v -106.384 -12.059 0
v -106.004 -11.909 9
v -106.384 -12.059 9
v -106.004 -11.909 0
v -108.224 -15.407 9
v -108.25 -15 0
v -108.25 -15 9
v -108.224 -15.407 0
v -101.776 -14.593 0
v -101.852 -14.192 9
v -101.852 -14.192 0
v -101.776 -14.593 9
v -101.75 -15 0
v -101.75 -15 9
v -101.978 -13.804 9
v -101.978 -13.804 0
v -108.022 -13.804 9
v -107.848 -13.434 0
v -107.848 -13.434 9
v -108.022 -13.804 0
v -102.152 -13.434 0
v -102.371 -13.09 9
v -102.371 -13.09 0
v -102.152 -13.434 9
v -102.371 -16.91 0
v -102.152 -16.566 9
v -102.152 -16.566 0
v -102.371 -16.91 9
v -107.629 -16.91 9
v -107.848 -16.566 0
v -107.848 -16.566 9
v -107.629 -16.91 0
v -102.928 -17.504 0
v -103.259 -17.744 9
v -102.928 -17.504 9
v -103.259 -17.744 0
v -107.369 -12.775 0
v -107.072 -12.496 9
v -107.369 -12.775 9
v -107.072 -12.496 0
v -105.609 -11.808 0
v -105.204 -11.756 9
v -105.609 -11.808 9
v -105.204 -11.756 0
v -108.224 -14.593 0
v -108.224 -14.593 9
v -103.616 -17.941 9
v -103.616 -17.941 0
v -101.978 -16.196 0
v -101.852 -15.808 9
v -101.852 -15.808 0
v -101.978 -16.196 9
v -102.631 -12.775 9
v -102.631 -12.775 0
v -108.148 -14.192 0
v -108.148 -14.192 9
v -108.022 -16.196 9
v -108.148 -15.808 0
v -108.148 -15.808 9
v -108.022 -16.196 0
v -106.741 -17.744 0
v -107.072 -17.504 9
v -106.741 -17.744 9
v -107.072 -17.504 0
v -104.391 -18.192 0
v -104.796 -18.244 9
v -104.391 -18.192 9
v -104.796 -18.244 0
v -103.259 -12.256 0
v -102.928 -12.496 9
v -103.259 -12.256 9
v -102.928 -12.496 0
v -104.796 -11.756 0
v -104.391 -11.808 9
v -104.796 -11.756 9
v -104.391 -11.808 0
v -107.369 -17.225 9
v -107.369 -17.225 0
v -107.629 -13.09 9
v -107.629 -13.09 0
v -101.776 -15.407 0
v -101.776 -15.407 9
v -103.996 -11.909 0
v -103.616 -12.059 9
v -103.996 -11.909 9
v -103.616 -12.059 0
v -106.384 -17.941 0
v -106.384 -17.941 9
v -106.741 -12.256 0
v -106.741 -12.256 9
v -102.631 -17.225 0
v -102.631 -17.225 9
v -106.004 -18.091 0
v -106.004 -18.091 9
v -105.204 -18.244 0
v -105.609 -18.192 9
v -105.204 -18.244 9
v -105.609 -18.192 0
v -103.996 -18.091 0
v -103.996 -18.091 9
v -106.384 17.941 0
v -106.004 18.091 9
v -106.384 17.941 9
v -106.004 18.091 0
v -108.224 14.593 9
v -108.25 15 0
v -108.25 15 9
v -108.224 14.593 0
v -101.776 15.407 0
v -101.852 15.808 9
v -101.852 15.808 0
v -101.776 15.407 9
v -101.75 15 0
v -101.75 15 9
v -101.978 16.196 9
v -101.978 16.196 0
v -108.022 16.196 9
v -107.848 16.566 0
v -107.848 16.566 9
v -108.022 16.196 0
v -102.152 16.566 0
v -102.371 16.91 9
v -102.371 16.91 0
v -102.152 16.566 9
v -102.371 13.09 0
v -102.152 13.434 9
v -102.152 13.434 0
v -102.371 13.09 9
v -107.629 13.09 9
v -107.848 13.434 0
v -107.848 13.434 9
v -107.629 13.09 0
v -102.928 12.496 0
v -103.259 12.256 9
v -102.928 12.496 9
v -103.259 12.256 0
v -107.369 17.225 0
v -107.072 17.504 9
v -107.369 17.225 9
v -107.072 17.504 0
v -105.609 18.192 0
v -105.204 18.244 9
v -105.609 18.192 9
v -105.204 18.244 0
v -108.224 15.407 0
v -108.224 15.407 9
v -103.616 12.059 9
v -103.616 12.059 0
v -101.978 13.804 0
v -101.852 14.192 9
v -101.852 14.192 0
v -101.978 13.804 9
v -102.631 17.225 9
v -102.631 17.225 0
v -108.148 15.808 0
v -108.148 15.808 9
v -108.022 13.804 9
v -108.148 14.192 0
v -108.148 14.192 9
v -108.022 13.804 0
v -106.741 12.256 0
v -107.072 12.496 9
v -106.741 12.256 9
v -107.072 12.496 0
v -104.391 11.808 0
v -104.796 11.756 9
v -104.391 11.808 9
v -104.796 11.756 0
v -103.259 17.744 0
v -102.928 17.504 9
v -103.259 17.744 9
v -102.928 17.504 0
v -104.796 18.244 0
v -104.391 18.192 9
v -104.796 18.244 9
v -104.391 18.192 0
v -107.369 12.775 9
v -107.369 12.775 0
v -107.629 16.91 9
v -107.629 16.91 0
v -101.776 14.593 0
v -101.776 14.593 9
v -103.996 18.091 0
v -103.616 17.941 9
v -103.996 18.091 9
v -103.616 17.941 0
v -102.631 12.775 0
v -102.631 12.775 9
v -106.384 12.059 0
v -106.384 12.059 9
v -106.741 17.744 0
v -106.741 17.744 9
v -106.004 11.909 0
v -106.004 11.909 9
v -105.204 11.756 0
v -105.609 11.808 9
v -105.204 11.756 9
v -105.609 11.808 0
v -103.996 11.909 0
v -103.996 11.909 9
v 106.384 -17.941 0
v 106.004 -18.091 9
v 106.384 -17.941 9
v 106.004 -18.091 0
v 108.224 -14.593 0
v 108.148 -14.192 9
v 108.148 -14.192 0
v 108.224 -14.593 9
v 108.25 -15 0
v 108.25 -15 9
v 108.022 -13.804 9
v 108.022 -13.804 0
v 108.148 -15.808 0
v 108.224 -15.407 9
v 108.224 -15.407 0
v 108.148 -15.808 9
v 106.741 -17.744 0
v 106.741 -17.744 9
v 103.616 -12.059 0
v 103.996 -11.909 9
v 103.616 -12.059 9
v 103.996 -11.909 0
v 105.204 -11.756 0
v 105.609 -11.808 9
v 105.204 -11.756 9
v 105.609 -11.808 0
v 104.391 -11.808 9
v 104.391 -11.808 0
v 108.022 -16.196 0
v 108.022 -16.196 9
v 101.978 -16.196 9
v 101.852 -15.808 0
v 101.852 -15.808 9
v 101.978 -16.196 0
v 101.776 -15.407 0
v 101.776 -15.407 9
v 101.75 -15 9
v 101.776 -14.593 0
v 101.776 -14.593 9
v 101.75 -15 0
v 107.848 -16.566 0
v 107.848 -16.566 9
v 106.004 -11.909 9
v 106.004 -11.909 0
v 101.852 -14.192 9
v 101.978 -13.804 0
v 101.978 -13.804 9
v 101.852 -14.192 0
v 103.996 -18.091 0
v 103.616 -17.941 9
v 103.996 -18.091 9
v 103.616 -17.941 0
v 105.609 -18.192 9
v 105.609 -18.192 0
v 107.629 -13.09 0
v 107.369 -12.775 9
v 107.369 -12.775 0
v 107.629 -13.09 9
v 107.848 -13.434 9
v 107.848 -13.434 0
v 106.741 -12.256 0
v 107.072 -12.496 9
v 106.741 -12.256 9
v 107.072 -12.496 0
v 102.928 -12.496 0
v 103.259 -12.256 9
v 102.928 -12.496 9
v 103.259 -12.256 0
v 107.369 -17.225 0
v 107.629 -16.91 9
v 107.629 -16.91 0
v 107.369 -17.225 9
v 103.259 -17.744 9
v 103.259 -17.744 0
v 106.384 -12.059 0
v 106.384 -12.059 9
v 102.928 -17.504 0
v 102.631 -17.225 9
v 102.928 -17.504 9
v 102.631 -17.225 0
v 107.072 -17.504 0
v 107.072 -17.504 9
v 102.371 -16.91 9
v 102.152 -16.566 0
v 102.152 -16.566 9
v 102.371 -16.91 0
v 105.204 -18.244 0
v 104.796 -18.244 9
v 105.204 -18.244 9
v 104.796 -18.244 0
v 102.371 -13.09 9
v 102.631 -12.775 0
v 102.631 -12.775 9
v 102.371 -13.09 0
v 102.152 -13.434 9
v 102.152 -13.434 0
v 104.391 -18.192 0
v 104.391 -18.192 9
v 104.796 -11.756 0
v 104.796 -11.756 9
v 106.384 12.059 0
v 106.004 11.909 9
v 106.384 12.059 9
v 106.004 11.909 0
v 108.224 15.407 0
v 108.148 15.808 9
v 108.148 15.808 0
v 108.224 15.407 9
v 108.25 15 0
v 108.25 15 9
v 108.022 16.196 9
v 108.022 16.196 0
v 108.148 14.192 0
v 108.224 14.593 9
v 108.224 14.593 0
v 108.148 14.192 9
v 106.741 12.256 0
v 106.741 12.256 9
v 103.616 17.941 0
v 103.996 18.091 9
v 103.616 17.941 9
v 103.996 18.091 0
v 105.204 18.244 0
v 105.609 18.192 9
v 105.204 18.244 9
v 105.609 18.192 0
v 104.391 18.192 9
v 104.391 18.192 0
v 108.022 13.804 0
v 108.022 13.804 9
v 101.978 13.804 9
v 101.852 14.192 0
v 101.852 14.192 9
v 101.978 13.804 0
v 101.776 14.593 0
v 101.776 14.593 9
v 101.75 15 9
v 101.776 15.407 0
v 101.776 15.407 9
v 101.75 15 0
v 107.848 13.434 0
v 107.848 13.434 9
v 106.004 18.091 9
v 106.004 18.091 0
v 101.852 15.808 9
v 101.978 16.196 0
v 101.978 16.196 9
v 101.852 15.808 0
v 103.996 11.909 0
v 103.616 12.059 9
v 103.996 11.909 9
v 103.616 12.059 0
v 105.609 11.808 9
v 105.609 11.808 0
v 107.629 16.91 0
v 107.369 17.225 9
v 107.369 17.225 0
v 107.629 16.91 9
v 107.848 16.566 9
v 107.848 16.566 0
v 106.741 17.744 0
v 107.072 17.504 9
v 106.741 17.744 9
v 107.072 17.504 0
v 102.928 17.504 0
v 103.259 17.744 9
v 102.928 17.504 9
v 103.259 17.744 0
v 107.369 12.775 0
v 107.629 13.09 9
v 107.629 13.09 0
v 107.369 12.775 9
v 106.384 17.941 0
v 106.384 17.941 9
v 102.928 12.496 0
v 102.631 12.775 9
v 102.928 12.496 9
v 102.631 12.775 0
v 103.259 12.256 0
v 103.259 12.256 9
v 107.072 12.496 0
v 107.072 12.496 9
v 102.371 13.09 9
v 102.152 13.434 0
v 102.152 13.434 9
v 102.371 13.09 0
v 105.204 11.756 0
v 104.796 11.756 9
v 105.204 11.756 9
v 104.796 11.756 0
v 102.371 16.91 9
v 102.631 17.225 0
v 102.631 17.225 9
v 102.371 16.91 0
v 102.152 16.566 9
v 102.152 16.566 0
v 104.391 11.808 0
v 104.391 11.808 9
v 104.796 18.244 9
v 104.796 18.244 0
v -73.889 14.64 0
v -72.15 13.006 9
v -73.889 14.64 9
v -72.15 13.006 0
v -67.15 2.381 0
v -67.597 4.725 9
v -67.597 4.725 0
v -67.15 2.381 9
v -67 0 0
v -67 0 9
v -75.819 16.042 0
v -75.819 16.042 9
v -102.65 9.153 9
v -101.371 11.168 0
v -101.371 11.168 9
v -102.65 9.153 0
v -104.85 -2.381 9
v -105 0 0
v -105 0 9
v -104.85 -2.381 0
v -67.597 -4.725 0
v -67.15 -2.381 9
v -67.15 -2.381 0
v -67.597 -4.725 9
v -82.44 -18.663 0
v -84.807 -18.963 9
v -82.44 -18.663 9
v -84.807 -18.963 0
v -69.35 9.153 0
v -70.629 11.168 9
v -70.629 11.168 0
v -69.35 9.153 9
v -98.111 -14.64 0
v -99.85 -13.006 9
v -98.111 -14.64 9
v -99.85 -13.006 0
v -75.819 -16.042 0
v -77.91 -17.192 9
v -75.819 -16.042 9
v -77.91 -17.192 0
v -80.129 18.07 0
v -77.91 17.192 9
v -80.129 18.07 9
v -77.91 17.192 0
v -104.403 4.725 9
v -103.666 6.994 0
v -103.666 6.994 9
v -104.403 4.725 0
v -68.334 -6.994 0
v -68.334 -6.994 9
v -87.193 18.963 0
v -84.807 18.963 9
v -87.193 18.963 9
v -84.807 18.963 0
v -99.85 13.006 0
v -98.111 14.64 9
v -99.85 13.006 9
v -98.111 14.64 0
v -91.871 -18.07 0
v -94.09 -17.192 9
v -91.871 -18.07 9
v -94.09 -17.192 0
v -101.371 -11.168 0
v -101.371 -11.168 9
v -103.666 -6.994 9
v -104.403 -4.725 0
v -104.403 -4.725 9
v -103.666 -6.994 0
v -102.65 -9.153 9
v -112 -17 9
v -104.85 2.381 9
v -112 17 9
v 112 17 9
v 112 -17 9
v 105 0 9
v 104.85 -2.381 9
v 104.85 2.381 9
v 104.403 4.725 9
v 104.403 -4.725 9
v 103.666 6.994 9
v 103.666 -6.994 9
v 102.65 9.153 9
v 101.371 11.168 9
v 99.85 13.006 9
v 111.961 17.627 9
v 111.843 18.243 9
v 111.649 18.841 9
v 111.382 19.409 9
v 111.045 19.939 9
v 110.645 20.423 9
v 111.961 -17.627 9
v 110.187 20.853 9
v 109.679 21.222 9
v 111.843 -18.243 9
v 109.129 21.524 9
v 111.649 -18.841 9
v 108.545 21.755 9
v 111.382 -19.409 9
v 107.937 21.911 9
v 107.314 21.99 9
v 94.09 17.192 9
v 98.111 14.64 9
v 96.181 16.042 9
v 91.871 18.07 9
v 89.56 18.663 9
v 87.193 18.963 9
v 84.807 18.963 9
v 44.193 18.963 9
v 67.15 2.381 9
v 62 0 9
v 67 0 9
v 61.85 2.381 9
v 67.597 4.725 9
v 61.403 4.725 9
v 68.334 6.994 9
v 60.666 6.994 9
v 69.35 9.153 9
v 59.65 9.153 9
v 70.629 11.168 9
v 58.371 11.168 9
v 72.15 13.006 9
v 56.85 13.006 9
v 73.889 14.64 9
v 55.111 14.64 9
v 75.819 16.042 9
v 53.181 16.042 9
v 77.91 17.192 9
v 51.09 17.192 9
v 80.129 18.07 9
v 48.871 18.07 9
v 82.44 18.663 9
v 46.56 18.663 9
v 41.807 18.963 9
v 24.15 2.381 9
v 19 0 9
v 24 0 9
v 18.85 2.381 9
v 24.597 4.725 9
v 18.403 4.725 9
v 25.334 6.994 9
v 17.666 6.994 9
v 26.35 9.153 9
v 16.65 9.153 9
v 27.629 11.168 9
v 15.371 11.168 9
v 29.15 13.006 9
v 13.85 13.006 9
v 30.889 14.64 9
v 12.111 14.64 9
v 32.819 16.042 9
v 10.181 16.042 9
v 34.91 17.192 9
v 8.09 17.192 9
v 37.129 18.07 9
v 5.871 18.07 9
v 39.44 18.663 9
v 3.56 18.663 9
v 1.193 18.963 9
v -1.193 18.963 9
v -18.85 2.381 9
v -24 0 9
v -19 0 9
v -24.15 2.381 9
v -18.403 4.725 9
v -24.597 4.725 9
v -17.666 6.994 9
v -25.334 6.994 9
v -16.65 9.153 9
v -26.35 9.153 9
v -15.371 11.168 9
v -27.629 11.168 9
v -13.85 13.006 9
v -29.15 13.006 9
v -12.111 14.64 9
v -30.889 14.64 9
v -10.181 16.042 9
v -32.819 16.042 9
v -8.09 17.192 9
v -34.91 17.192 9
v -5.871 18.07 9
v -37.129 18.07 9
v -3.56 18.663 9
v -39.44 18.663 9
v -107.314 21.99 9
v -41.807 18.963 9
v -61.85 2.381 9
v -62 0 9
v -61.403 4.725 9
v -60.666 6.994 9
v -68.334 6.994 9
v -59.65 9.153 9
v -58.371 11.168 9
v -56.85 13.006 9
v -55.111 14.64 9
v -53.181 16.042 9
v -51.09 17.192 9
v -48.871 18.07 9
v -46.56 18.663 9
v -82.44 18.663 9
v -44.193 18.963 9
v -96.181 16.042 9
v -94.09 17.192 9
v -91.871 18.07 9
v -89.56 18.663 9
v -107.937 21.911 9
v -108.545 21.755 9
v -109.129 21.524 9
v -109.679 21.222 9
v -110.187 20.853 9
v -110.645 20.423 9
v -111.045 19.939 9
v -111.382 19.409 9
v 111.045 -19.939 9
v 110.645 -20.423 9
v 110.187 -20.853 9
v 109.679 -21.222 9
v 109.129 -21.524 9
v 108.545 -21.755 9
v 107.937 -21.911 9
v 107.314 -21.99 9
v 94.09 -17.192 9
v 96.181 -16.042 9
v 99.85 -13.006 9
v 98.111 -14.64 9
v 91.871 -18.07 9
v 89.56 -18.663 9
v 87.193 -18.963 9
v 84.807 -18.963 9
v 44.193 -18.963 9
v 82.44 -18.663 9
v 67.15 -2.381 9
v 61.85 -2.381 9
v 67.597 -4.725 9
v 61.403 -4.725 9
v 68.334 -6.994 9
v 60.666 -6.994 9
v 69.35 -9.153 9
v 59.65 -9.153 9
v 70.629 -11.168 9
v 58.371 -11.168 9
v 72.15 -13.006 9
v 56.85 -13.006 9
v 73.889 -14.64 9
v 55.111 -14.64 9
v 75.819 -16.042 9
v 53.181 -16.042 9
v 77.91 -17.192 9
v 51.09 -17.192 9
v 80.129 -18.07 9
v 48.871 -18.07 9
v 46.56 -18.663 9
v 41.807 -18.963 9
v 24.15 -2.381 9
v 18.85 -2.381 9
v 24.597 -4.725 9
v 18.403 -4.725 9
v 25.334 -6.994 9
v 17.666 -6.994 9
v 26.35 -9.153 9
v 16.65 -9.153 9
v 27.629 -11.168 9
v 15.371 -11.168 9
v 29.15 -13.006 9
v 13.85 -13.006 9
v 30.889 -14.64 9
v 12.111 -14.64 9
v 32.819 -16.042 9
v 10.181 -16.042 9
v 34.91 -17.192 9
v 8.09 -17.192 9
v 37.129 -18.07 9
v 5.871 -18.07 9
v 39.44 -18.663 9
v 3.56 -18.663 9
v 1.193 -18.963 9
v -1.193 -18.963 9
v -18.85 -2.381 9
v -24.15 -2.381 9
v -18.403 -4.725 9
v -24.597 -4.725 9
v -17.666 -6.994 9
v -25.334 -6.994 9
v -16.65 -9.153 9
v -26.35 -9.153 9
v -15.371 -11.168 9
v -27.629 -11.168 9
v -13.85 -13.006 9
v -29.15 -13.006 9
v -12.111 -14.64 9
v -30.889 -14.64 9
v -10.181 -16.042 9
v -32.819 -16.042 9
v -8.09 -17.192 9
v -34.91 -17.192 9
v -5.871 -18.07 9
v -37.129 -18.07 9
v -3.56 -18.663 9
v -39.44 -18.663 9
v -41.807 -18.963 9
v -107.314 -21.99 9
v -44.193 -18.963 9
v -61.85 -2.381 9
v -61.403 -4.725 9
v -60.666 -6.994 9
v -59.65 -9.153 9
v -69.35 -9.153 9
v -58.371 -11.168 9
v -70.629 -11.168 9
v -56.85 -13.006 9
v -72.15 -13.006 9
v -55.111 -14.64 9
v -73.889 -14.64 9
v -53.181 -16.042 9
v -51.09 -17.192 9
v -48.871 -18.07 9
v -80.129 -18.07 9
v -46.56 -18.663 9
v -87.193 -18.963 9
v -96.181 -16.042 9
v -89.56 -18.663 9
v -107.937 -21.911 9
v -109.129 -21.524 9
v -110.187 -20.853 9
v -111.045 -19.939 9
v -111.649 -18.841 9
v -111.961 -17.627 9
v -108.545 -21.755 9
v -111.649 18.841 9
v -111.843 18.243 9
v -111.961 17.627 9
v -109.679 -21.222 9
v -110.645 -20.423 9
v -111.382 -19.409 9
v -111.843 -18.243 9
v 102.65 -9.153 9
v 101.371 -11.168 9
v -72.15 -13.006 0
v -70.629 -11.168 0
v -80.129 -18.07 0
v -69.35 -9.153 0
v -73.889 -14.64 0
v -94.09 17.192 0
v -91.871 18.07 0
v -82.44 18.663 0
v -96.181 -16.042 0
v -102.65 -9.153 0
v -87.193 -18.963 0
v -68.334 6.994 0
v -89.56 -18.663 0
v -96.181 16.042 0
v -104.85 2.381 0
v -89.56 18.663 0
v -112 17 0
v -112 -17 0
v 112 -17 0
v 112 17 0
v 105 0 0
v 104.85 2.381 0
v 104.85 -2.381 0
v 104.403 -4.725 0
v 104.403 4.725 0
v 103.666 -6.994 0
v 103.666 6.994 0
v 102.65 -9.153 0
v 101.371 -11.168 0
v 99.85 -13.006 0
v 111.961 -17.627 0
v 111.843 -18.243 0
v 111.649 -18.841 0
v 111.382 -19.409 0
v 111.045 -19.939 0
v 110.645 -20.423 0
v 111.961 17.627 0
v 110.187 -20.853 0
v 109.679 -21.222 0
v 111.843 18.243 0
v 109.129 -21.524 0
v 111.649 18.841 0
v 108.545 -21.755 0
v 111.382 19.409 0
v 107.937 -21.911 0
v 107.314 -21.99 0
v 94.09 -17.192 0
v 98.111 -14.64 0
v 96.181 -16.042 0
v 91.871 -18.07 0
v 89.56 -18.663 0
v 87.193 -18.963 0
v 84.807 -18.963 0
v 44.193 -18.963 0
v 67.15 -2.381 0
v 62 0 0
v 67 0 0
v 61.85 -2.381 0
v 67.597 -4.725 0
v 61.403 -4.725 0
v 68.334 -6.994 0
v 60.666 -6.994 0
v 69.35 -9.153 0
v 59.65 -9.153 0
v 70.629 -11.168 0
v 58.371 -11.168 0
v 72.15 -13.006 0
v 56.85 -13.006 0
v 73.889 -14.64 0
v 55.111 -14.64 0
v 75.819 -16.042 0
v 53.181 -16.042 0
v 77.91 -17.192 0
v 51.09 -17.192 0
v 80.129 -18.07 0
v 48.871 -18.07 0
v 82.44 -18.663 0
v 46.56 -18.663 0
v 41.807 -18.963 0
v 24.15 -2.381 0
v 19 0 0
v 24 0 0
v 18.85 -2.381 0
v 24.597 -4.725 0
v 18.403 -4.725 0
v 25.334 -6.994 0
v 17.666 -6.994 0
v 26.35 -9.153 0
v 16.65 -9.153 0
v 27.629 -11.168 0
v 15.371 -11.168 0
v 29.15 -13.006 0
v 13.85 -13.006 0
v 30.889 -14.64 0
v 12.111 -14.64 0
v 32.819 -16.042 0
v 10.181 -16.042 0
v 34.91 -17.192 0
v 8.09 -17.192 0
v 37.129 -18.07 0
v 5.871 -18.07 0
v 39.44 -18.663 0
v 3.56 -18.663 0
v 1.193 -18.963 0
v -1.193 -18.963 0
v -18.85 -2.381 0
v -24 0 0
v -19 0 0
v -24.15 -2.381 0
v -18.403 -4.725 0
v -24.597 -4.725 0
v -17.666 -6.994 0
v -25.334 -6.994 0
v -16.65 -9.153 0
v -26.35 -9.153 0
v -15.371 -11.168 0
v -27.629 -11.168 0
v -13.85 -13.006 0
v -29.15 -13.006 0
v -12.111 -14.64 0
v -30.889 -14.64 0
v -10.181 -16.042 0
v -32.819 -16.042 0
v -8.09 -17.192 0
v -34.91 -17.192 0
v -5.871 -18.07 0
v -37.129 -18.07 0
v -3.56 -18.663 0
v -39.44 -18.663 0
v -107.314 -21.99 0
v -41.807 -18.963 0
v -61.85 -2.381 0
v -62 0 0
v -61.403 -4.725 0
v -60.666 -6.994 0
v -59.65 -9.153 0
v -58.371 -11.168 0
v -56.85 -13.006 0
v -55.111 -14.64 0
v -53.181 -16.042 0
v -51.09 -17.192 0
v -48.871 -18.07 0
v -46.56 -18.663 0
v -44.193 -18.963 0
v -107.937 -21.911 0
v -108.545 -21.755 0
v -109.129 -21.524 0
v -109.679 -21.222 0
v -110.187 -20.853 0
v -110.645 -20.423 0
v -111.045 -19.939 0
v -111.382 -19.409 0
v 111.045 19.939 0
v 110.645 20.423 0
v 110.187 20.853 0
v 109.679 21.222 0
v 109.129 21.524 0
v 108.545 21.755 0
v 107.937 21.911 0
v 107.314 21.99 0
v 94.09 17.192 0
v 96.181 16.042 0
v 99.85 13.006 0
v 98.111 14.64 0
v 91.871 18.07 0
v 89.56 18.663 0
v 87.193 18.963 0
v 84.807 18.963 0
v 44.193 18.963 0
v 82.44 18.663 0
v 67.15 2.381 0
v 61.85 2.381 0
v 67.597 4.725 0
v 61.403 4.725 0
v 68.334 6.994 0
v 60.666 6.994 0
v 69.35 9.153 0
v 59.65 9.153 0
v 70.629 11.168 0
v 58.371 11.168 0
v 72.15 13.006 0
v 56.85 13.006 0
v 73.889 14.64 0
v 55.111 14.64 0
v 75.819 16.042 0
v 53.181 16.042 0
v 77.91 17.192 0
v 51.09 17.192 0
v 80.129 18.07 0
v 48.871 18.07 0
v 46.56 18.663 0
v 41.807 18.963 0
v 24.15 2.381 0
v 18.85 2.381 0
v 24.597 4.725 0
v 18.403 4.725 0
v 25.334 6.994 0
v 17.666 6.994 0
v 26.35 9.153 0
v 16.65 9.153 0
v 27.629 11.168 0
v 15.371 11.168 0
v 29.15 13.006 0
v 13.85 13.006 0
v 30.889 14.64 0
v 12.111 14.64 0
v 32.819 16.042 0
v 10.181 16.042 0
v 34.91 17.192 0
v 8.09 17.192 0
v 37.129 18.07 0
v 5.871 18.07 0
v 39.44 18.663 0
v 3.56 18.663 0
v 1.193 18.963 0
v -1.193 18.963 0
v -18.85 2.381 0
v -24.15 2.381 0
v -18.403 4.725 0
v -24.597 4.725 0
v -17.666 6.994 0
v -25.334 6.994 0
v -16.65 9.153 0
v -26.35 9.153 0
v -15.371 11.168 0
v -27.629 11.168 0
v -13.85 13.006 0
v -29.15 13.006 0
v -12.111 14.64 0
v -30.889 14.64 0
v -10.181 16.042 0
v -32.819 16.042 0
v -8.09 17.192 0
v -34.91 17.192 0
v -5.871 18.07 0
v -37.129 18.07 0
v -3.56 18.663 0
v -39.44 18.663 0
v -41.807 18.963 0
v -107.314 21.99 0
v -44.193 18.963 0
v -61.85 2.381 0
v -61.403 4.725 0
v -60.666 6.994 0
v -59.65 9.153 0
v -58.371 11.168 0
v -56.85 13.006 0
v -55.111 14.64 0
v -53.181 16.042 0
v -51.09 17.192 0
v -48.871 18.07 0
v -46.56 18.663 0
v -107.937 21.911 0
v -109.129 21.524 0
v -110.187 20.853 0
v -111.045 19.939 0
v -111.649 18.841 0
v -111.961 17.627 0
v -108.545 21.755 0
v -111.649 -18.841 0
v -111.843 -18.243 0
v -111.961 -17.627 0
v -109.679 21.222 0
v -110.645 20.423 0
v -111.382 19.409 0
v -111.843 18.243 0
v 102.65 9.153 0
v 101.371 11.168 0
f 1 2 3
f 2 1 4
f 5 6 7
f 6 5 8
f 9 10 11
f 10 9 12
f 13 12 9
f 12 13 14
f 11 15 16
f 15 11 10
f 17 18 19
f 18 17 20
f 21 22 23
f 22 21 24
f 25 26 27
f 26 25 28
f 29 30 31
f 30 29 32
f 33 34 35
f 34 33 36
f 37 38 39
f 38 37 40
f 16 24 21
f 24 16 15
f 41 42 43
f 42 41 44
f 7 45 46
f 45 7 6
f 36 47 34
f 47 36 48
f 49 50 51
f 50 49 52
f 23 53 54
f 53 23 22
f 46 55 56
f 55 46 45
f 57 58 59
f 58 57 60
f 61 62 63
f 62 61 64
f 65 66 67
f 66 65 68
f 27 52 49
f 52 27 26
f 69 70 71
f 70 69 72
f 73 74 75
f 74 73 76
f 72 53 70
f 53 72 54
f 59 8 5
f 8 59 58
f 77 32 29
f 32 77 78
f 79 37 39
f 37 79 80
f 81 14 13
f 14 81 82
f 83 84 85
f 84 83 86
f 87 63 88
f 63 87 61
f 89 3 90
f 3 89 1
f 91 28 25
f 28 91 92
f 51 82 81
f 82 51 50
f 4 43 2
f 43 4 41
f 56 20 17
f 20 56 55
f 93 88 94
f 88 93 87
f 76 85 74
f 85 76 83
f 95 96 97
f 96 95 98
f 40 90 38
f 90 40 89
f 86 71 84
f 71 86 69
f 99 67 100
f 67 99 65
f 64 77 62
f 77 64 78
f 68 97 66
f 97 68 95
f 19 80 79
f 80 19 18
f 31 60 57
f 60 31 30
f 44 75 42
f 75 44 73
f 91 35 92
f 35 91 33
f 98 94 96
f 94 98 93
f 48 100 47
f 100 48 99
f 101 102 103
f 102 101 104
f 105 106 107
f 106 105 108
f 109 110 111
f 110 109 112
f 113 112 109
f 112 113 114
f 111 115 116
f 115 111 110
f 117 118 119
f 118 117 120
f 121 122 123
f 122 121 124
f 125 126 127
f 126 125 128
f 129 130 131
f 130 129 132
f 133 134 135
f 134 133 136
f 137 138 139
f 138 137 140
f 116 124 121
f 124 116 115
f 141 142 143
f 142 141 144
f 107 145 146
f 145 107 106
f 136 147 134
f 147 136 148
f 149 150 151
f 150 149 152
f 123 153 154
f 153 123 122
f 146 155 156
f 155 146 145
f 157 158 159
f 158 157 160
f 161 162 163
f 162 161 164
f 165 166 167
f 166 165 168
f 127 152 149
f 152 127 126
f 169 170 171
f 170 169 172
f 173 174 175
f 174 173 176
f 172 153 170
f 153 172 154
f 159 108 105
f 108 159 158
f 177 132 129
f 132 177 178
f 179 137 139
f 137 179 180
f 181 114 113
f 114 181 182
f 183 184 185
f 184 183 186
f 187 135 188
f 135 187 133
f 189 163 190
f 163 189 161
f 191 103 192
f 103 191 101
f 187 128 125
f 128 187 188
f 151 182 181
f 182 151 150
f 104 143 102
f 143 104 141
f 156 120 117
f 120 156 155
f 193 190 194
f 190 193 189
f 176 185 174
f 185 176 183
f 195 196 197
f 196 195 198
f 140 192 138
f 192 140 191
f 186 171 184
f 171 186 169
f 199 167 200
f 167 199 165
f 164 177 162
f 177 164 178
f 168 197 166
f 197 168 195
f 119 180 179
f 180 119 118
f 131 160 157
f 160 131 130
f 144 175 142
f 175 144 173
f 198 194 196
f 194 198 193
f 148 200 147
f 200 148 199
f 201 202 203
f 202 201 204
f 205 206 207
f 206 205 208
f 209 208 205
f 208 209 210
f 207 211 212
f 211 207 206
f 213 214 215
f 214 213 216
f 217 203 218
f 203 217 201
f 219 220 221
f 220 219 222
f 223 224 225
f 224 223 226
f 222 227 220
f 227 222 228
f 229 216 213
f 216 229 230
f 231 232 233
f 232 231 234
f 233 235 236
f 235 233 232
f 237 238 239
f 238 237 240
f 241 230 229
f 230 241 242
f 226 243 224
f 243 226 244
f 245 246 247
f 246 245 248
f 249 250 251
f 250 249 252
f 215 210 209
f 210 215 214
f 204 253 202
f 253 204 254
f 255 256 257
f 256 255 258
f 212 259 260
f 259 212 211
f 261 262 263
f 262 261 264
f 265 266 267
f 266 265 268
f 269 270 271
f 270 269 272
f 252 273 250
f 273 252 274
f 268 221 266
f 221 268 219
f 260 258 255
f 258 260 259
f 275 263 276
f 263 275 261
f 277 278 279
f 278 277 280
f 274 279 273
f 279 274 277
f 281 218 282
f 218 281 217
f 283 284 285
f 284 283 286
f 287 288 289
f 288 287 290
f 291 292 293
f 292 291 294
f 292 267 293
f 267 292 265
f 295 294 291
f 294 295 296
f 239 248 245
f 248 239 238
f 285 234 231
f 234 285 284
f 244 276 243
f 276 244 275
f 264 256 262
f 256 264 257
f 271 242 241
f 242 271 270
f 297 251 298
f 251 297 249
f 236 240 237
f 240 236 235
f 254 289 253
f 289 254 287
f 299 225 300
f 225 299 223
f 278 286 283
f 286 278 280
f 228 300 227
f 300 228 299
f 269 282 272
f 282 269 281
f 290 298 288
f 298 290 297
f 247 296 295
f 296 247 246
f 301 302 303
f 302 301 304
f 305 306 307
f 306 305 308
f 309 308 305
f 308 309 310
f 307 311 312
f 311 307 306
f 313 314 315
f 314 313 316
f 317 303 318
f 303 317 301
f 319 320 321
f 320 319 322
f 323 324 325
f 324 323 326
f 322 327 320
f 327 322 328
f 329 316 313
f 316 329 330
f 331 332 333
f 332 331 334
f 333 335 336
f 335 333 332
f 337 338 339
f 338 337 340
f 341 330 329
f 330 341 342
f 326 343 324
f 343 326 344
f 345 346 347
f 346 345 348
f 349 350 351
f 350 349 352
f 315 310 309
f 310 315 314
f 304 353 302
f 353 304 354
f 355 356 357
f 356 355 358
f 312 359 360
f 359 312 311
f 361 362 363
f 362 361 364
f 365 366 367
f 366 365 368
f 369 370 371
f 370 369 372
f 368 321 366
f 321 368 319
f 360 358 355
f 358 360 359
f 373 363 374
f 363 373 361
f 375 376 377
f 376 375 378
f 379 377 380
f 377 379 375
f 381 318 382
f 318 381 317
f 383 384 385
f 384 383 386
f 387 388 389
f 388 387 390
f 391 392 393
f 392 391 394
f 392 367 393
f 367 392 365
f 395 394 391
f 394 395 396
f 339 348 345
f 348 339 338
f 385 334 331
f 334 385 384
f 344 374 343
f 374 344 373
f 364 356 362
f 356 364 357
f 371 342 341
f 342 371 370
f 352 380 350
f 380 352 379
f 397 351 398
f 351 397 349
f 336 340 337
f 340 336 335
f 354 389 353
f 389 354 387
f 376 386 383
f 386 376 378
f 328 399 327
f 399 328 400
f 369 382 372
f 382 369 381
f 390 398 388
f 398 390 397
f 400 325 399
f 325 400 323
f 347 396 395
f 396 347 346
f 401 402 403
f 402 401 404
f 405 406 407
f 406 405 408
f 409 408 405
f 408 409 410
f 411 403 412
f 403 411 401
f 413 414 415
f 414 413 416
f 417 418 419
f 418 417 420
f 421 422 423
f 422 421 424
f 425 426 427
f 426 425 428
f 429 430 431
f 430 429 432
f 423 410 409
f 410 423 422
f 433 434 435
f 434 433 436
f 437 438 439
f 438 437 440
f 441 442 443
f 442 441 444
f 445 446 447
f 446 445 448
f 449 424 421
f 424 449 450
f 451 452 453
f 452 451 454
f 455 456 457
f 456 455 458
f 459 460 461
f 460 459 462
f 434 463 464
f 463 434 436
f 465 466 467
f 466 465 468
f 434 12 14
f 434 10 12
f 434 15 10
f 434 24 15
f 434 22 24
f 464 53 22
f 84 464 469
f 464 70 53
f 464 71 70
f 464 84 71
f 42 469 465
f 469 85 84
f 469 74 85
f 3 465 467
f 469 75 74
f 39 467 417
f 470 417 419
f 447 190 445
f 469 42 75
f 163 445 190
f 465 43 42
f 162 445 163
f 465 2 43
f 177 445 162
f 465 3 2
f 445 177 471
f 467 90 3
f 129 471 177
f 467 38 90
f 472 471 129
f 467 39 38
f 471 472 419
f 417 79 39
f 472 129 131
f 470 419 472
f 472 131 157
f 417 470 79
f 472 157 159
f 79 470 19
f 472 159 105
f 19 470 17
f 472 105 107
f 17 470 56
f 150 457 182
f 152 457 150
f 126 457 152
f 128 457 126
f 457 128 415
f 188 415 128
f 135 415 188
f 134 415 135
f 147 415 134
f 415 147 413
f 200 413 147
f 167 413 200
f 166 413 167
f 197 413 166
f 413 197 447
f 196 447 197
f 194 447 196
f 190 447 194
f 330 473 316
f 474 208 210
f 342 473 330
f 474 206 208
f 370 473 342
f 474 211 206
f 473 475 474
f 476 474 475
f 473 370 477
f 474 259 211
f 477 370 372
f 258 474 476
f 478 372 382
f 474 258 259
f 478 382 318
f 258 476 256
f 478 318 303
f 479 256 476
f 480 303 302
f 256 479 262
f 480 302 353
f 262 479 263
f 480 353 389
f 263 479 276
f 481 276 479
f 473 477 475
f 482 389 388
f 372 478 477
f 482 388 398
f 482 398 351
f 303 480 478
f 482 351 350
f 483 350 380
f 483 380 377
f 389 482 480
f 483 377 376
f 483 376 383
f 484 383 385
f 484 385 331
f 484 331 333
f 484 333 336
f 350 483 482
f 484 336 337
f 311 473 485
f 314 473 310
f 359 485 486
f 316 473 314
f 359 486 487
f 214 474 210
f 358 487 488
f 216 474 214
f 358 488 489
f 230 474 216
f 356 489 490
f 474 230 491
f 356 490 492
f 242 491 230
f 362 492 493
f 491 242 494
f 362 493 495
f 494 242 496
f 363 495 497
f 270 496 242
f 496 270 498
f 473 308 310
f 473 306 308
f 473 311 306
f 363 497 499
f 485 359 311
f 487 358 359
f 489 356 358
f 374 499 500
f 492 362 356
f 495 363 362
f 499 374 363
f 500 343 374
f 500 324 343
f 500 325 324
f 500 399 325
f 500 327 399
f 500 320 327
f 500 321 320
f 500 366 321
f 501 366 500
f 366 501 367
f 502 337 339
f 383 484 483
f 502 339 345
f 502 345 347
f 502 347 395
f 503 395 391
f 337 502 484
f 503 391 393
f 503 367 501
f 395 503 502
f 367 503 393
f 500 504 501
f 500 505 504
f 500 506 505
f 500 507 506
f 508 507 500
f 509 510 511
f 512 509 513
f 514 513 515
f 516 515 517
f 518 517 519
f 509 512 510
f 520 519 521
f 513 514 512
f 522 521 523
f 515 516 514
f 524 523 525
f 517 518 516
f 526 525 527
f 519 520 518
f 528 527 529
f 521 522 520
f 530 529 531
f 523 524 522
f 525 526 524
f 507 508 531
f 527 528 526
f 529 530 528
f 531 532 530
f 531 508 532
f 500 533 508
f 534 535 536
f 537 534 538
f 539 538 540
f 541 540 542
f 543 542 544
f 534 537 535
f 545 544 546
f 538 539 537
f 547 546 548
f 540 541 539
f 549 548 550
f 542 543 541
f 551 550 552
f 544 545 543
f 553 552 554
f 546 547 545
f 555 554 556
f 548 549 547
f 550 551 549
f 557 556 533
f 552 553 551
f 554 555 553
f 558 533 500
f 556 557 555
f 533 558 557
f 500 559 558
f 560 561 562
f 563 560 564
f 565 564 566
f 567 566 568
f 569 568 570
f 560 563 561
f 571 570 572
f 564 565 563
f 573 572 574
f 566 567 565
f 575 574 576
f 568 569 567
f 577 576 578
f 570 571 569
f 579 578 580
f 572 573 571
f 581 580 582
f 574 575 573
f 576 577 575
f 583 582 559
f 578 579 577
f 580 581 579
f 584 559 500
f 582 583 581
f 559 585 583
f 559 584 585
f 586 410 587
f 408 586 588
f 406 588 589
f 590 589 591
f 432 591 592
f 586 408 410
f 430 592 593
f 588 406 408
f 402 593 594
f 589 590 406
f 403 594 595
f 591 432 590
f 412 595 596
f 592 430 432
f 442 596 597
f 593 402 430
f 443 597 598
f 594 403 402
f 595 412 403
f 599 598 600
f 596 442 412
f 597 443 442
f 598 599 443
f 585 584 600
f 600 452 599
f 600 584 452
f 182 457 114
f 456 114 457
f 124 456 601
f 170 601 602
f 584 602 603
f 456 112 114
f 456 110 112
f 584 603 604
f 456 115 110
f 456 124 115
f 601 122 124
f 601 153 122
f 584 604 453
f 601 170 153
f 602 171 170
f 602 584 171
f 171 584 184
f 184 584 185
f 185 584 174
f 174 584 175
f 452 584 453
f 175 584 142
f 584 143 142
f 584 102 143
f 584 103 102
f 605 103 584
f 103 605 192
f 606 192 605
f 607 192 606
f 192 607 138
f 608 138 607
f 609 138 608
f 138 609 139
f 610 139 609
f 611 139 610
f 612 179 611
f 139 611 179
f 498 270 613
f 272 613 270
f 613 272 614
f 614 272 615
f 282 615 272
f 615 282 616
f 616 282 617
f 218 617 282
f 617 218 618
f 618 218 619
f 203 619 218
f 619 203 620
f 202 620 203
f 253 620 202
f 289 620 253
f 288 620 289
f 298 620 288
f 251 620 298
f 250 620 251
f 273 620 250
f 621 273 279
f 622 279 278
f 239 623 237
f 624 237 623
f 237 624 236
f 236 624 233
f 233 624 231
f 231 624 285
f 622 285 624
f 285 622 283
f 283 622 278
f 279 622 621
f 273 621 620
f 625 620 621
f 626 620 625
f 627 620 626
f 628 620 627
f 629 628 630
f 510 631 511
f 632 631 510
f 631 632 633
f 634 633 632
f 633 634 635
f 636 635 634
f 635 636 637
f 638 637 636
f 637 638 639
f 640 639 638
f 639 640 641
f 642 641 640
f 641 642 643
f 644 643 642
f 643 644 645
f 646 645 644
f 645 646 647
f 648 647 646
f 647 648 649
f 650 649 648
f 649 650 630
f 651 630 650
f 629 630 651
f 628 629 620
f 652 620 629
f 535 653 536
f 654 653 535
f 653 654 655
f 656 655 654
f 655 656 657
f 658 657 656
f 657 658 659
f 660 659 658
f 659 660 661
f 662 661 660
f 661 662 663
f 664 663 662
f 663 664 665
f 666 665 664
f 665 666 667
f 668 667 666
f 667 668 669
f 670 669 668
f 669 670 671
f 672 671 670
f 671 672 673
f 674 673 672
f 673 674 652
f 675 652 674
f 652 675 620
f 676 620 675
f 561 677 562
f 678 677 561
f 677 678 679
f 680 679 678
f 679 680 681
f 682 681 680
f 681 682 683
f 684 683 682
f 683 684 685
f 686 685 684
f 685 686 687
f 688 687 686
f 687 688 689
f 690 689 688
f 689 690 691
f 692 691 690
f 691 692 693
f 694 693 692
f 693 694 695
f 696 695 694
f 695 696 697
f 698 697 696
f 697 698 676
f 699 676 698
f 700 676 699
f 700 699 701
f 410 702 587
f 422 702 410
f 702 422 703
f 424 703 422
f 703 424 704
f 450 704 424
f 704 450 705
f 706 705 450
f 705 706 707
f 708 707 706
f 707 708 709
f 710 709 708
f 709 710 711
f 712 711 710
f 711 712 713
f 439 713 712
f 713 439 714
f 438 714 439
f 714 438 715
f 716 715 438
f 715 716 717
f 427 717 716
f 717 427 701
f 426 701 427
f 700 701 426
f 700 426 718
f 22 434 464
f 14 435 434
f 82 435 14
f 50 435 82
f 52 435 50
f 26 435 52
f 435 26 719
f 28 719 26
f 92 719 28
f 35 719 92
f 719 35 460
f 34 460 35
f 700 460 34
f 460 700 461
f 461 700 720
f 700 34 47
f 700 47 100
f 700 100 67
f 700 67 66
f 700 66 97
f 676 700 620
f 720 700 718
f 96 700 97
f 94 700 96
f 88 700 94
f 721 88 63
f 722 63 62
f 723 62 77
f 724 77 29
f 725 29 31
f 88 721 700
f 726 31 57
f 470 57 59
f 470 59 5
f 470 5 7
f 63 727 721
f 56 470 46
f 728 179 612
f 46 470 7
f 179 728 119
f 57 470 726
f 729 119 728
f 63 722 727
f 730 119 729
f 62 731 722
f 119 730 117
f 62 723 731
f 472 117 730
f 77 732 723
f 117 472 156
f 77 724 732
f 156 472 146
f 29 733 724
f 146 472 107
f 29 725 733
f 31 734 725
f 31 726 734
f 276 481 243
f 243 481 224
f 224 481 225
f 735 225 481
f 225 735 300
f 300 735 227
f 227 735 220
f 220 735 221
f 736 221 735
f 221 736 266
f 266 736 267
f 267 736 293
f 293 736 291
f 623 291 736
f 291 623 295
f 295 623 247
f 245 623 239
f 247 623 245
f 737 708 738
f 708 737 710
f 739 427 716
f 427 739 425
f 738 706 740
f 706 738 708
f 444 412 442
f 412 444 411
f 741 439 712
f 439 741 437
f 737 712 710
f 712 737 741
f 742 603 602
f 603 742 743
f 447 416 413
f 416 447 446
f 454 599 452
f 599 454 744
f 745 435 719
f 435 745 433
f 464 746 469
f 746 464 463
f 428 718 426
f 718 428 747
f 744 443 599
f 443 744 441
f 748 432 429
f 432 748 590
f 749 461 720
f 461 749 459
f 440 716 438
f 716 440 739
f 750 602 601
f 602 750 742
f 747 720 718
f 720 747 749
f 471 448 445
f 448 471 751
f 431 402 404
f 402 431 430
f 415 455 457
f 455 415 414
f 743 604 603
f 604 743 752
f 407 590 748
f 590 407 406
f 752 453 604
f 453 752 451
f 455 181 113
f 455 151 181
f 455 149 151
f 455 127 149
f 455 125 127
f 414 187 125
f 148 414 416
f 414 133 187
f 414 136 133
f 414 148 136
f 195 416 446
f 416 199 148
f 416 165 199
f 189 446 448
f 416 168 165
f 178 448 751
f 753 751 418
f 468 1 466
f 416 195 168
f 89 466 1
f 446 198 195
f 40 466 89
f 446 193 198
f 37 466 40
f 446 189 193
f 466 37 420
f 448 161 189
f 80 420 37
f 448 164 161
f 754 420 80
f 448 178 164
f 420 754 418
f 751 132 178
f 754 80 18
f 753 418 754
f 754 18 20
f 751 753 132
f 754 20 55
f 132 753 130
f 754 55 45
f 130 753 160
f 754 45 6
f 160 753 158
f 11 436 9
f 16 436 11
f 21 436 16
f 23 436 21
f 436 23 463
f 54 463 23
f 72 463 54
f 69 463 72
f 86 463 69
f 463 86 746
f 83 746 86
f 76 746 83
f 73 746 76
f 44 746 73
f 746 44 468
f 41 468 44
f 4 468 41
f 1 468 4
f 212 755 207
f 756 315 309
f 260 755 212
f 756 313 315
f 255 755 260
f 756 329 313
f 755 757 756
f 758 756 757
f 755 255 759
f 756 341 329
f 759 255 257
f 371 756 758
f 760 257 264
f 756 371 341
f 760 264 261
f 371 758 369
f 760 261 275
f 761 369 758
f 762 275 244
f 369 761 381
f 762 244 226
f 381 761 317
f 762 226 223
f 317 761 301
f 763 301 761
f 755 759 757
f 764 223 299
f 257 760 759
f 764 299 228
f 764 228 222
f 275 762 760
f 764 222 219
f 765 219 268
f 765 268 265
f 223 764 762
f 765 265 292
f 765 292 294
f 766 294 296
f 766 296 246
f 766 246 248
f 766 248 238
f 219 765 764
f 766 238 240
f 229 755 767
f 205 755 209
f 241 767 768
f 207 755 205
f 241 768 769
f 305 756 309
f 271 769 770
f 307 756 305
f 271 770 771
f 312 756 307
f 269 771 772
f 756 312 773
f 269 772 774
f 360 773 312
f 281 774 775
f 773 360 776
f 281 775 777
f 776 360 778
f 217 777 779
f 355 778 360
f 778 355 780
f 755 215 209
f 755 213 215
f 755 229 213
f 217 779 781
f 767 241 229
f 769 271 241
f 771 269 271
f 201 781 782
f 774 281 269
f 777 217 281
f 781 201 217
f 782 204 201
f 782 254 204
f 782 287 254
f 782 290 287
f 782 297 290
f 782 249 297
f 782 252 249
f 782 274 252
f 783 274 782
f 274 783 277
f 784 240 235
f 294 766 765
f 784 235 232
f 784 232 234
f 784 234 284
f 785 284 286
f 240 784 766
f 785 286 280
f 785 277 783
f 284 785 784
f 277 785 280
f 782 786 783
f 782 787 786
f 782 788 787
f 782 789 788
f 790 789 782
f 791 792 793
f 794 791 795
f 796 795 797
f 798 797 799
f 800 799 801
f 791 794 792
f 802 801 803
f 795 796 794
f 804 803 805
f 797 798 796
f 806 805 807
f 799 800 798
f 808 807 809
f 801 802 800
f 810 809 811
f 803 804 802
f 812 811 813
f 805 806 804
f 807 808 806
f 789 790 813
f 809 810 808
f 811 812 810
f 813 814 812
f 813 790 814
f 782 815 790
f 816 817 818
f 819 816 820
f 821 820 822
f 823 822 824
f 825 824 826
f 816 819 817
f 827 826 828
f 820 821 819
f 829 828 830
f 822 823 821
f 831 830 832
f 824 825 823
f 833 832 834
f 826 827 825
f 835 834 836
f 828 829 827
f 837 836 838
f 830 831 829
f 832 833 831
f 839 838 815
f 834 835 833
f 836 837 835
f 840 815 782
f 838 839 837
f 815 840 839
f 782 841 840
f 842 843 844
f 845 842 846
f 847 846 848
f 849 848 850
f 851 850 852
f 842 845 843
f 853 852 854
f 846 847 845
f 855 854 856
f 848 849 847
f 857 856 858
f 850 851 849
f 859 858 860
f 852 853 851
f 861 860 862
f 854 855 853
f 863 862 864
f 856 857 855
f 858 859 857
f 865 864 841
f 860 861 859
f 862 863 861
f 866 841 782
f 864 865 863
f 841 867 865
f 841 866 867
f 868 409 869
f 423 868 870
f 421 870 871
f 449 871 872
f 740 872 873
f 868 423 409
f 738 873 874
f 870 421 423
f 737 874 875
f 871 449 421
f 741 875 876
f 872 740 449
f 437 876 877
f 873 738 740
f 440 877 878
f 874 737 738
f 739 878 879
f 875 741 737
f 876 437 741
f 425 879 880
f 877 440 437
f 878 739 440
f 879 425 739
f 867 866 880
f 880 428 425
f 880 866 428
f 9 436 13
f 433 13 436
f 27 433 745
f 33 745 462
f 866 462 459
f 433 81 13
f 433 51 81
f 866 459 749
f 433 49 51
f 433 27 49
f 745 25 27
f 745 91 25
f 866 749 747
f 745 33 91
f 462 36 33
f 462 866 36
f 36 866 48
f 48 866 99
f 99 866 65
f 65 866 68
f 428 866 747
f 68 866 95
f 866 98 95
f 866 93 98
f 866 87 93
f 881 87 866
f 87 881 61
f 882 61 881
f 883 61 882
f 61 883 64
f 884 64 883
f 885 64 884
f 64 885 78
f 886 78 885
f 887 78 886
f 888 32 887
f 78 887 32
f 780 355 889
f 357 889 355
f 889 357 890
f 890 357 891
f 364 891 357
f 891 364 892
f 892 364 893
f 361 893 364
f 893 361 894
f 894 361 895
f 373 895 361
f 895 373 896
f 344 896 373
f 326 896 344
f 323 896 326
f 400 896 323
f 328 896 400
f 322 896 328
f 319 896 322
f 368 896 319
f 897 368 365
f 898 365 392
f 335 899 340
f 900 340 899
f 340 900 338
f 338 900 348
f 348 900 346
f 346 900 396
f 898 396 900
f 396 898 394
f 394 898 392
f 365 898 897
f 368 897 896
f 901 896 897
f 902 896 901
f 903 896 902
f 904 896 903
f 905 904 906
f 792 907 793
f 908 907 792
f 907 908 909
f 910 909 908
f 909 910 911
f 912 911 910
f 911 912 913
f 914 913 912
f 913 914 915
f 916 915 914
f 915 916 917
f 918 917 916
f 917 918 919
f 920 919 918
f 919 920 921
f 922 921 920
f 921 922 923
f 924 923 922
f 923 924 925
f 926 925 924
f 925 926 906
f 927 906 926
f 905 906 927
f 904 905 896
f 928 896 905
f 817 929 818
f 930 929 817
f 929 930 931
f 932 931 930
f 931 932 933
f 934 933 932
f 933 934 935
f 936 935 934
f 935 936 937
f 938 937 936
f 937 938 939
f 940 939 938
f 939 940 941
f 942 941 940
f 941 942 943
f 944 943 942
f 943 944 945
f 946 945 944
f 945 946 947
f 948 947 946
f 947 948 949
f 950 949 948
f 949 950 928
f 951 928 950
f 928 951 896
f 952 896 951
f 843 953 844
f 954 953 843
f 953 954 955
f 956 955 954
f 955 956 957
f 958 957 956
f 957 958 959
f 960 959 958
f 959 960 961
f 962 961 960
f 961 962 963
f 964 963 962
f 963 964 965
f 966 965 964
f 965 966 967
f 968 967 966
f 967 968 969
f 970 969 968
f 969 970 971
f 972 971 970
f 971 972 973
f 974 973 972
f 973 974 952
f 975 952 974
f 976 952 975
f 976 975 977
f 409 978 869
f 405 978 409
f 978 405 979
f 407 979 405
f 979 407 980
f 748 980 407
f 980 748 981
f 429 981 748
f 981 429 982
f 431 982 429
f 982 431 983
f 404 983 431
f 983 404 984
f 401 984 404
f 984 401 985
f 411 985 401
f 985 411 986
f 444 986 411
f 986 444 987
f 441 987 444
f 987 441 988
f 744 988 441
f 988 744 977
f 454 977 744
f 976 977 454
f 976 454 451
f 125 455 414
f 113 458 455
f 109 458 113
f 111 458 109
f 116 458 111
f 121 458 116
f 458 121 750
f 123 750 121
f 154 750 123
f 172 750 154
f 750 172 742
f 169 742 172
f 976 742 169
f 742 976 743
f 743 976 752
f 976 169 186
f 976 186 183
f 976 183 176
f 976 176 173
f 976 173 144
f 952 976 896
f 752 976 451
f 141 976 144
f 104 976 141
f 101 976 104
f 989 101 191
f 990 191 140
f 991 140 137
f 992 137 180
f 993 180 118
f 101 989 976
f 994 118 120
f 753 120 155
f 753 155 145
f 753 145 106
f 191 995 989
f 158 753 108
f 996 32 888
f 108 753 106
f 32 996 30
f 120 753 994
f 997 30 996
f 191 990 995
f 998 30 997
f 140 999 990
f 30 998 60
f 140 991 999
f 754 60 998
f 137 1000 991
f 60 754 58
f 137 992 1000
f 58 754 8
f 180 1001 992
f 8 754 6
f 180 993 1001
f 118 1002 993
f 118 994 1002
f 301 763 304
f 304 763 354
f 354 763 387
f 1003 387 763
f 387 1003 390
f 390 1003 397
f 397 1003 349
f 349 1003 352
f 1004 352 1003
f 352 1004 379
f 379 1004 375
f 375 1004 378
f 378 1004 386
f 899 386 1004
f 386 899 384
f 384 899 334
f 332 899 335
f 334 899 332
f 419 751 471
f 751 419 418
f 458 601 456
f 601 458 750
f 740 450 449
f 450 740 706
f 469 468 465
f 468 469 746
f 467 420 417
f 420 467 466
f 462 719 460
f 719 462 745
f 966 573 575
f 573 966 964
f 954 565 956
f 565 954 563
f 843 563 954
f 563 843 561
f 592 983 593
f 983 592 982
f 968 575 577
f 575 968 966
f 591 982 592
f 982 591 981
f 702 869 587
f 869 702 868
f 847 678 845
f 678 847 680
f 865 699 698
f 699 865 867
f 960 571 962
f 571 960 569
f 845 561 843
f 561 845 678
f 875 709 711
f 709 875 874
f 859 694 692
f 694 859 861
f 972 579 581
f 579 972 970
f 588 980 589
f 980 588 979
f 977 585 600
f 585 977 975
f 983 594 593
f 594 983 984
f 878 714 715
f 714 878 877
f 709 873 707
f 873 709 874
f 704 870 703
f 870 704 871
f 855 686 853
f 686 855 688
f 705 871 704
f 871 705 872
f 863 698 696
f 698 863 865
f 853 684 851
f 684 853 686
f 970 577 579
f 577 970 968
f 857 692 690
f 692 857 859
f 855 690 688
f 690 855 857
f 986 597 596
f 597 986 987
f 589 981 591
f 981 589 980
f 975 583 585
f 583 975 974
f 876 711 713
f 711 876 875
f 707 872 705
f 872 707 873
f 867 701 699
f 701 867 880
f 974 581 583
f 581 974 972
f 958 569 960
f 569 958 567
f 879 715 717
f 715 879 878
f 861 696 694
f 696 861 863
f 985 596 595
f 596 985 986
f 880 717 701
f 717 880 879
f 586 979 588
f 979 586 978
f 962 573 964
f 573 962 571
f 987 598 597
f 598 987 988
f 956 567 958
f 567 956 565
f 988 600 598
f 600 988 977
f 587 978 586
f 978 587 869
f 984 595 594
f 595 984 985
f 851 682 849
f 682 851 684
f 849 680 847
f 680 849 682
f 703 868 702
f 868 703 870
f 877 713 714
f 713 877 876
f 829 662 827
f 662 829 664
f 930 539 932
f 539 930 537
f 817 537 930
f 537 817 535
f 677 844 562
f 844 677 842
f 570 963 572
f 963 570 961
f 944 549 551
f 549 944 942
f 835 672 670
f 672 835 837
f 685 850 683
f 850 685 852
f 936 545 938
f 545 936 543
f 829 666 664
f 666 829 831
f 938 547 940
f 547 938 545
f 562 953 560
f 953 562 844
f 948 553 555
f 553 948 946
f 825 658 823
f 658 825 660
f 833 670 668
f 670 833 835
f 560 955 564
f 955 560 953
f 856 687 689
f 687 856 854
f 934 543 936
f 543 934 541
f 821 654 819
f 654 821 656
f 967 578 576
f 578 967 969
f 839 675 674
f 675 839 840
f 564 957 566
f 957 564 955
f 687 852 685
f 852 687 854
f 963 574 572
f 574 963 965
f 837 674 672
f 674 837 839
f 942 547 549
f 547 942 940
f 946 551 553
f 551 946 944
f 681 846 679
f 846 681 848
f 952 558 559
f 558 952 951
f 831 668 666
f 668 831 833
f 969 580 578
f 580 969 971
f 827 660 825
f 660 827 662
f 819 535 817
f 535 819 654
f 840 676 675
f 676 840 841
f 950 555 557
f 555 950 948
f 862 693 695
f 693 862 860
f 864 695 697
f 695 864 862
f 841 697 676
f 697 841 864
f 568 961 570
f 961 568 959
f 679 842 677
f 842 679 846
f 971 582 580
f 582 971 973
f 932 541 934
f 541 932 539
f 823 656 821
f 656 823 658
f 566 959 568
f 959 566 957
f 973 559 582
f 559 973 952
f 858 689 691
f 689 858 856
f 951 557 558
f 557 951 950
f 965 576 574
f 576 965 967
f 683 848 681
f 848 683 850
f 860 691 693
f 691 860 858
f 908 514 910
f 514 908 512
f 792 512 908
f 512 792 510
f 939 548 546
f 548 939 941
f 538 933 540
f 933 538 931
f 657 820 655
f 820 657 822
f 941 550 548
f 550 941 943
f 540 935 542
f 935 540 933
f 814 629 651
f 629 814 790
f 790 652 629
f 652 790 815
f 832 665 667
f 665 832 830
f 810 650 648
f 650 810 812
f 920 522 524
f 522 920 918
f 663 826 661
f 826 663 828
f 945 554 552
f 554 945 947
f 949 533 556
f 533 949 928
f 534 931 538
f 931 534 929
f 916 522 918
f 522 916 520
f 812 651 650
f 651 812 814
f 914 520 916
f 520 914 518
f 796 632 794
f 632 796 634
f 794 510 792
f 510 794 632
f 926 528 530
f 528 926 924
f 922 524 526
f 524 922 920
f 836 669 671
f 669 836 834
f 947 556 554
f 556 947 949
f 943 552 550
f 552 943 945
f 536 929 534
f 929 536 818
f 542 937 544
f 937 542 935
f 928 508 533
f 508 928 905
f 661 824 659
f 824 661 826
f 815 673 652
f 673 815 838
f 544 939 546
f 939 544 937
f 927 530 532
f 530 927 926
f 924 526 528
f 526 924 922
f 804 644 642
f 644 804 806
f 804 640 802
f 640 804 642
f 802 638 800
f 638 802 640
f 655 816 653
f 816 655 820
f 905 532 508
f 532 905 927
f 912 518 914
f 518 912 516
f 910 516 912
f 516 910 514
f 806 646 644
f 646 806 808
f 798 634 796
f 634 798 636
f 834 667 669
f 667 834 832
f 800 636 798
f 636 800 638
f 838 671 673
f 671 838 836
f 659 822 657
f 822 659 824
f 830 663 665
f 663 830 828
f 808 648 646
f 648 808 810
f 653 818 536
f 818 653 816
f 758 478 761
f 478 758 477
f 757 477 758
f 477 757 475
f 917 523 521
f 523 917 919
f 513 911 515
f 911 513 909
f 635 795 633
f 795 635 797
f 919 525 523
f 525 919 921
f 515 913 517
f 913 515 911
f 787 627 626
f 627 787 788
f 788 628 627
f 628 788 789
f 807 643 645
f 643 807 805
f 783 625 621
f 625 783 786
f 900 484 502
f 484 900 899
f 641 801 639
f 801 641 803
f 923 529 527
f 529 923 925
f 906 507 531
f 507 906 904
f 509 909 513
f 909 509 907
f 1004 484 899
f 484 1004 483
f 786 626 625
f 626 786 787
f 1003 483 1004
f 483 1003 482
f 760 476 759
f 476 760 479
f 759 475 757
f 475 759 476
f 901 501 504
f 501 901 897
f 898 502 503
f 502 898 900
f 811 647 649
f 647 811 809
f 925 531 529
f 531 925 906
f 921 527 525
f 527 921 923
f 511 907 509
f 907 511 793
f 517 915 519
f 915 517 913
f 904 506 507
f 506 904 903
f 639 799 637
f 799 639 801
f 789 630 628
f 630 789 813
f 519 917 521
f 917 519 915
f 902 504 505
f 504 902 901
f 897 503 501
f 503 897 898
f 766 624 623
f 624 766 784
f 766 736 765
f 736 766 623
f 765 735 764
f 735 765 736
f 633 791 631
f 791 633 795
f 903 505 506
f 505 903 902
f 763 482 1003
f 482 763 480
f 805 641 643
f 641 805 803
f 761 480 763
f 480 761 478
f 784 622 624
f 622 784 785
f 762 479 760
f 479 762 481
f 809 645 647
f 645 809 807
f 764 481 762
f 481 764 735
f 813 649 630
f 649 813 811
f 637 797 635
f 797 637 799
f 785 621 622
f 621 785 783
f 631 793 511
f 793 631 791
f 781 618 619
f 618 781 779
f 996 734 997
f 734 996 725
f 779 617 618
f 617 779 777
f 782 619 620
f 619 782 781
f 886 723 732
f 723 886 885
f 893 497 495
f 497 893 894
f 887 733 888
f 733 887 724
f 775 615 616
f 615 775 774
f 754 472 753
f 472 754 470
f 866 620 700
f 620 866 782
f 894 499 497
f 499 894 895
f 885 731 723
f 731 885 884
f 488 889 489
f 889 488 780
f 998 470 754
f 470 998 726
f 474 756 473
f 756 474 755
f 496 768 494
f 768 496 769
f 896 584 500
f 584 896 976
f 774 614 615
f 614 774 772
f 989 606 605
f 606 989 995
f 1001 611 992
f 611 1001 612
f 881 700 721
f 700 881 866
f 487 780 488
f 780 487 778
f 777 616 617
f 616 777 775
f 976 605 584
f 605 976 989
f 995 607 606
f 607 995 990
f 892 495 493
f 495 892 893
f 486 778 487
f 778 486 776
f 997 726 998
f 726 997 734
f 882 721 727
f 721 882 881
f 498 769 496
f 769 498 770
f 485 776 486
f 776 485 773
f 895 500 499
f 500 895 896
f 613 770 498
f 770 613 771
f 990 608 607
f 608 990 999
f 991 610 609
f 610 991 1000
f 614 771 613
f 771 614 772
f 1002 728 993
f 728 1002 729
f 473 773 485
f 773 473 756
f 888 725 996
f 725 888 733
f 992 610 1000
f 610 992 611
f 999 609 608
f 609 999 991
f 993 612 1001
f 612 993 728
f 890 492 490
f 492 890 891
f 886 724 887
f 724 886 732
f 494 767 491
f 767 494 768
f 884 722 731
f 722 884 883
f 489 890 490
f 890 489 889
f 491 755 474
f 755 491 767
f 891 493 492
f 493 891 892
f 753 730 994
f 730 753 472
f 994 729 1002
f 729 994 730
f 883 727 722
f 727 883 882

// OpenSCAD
$fn = 50;

difference() {
	union() {
		hull() {
			translate(v = [-107.0, 17.0, 0]) {
				cylinder(h = 9, r = 5);
			}
			translate(v = [107.0, 17.0, 0]) {
				cylinder(h = 9, r = 5);
			}
			translate(v = [-107.0, -17.0, 0]) {
				cylinder(h = 9, r = 5);
			}
			translate(v = [107.0, -17.0, 0]) {
				cylinder(h = 9, r = 5);
			}
		}
	}
	union() {
		translate(v = [-105.0, -15.0, -100.0]) {
			cylinder(h = 200, r = 3.25);
		}
		translate(v = [-105.0, 15.0, -100.0]) {
			cylinder(h = 200, r = 3.25);
		}
		translate(v = [105.0, -15.0, -100.0]) {
			cylinder(h = 200, r = 3.25);
		}
		translate(v = [105.0, 15.0, -100.0]) {
			cylinder(h = 200, r = 3.25);
		}
		translate(v = [-105.0, -15.0, -100.0]) {
			cylinder(h = 200, r = 1.8);
		}
		translate(v = [-105.0, 15.0, -100.0]) {
			cylinder(h = 200, r = 1.8);
		}
		translate(v = [105.0, -15.0, -100.0]) {
			cylinder(h = 200, r = 1.8);
		}
		translate(v = [105.0, 15.0, -100.0]) {
			cylinder(h = 200, r = 1.8);
		}
		translate(v = [-86.0, 0, 0.0]) {
			cylinder(h = 9, r = 19.0);
		}
		translate(v = [-43.0, 0, 0.0]) {
			cylinder(h = 9, r = 19.0);
		}
		cylinder(h = 9, r = 19.0);
		translate(v = [43.0, 0, 0.0]) {
			cylinder(h = 9, r = 19.0);
		}
		translate(v = [86.0, 0, 0.0]) {
			cylinder(h = 9, r = 19.0);
		}
	}
}
